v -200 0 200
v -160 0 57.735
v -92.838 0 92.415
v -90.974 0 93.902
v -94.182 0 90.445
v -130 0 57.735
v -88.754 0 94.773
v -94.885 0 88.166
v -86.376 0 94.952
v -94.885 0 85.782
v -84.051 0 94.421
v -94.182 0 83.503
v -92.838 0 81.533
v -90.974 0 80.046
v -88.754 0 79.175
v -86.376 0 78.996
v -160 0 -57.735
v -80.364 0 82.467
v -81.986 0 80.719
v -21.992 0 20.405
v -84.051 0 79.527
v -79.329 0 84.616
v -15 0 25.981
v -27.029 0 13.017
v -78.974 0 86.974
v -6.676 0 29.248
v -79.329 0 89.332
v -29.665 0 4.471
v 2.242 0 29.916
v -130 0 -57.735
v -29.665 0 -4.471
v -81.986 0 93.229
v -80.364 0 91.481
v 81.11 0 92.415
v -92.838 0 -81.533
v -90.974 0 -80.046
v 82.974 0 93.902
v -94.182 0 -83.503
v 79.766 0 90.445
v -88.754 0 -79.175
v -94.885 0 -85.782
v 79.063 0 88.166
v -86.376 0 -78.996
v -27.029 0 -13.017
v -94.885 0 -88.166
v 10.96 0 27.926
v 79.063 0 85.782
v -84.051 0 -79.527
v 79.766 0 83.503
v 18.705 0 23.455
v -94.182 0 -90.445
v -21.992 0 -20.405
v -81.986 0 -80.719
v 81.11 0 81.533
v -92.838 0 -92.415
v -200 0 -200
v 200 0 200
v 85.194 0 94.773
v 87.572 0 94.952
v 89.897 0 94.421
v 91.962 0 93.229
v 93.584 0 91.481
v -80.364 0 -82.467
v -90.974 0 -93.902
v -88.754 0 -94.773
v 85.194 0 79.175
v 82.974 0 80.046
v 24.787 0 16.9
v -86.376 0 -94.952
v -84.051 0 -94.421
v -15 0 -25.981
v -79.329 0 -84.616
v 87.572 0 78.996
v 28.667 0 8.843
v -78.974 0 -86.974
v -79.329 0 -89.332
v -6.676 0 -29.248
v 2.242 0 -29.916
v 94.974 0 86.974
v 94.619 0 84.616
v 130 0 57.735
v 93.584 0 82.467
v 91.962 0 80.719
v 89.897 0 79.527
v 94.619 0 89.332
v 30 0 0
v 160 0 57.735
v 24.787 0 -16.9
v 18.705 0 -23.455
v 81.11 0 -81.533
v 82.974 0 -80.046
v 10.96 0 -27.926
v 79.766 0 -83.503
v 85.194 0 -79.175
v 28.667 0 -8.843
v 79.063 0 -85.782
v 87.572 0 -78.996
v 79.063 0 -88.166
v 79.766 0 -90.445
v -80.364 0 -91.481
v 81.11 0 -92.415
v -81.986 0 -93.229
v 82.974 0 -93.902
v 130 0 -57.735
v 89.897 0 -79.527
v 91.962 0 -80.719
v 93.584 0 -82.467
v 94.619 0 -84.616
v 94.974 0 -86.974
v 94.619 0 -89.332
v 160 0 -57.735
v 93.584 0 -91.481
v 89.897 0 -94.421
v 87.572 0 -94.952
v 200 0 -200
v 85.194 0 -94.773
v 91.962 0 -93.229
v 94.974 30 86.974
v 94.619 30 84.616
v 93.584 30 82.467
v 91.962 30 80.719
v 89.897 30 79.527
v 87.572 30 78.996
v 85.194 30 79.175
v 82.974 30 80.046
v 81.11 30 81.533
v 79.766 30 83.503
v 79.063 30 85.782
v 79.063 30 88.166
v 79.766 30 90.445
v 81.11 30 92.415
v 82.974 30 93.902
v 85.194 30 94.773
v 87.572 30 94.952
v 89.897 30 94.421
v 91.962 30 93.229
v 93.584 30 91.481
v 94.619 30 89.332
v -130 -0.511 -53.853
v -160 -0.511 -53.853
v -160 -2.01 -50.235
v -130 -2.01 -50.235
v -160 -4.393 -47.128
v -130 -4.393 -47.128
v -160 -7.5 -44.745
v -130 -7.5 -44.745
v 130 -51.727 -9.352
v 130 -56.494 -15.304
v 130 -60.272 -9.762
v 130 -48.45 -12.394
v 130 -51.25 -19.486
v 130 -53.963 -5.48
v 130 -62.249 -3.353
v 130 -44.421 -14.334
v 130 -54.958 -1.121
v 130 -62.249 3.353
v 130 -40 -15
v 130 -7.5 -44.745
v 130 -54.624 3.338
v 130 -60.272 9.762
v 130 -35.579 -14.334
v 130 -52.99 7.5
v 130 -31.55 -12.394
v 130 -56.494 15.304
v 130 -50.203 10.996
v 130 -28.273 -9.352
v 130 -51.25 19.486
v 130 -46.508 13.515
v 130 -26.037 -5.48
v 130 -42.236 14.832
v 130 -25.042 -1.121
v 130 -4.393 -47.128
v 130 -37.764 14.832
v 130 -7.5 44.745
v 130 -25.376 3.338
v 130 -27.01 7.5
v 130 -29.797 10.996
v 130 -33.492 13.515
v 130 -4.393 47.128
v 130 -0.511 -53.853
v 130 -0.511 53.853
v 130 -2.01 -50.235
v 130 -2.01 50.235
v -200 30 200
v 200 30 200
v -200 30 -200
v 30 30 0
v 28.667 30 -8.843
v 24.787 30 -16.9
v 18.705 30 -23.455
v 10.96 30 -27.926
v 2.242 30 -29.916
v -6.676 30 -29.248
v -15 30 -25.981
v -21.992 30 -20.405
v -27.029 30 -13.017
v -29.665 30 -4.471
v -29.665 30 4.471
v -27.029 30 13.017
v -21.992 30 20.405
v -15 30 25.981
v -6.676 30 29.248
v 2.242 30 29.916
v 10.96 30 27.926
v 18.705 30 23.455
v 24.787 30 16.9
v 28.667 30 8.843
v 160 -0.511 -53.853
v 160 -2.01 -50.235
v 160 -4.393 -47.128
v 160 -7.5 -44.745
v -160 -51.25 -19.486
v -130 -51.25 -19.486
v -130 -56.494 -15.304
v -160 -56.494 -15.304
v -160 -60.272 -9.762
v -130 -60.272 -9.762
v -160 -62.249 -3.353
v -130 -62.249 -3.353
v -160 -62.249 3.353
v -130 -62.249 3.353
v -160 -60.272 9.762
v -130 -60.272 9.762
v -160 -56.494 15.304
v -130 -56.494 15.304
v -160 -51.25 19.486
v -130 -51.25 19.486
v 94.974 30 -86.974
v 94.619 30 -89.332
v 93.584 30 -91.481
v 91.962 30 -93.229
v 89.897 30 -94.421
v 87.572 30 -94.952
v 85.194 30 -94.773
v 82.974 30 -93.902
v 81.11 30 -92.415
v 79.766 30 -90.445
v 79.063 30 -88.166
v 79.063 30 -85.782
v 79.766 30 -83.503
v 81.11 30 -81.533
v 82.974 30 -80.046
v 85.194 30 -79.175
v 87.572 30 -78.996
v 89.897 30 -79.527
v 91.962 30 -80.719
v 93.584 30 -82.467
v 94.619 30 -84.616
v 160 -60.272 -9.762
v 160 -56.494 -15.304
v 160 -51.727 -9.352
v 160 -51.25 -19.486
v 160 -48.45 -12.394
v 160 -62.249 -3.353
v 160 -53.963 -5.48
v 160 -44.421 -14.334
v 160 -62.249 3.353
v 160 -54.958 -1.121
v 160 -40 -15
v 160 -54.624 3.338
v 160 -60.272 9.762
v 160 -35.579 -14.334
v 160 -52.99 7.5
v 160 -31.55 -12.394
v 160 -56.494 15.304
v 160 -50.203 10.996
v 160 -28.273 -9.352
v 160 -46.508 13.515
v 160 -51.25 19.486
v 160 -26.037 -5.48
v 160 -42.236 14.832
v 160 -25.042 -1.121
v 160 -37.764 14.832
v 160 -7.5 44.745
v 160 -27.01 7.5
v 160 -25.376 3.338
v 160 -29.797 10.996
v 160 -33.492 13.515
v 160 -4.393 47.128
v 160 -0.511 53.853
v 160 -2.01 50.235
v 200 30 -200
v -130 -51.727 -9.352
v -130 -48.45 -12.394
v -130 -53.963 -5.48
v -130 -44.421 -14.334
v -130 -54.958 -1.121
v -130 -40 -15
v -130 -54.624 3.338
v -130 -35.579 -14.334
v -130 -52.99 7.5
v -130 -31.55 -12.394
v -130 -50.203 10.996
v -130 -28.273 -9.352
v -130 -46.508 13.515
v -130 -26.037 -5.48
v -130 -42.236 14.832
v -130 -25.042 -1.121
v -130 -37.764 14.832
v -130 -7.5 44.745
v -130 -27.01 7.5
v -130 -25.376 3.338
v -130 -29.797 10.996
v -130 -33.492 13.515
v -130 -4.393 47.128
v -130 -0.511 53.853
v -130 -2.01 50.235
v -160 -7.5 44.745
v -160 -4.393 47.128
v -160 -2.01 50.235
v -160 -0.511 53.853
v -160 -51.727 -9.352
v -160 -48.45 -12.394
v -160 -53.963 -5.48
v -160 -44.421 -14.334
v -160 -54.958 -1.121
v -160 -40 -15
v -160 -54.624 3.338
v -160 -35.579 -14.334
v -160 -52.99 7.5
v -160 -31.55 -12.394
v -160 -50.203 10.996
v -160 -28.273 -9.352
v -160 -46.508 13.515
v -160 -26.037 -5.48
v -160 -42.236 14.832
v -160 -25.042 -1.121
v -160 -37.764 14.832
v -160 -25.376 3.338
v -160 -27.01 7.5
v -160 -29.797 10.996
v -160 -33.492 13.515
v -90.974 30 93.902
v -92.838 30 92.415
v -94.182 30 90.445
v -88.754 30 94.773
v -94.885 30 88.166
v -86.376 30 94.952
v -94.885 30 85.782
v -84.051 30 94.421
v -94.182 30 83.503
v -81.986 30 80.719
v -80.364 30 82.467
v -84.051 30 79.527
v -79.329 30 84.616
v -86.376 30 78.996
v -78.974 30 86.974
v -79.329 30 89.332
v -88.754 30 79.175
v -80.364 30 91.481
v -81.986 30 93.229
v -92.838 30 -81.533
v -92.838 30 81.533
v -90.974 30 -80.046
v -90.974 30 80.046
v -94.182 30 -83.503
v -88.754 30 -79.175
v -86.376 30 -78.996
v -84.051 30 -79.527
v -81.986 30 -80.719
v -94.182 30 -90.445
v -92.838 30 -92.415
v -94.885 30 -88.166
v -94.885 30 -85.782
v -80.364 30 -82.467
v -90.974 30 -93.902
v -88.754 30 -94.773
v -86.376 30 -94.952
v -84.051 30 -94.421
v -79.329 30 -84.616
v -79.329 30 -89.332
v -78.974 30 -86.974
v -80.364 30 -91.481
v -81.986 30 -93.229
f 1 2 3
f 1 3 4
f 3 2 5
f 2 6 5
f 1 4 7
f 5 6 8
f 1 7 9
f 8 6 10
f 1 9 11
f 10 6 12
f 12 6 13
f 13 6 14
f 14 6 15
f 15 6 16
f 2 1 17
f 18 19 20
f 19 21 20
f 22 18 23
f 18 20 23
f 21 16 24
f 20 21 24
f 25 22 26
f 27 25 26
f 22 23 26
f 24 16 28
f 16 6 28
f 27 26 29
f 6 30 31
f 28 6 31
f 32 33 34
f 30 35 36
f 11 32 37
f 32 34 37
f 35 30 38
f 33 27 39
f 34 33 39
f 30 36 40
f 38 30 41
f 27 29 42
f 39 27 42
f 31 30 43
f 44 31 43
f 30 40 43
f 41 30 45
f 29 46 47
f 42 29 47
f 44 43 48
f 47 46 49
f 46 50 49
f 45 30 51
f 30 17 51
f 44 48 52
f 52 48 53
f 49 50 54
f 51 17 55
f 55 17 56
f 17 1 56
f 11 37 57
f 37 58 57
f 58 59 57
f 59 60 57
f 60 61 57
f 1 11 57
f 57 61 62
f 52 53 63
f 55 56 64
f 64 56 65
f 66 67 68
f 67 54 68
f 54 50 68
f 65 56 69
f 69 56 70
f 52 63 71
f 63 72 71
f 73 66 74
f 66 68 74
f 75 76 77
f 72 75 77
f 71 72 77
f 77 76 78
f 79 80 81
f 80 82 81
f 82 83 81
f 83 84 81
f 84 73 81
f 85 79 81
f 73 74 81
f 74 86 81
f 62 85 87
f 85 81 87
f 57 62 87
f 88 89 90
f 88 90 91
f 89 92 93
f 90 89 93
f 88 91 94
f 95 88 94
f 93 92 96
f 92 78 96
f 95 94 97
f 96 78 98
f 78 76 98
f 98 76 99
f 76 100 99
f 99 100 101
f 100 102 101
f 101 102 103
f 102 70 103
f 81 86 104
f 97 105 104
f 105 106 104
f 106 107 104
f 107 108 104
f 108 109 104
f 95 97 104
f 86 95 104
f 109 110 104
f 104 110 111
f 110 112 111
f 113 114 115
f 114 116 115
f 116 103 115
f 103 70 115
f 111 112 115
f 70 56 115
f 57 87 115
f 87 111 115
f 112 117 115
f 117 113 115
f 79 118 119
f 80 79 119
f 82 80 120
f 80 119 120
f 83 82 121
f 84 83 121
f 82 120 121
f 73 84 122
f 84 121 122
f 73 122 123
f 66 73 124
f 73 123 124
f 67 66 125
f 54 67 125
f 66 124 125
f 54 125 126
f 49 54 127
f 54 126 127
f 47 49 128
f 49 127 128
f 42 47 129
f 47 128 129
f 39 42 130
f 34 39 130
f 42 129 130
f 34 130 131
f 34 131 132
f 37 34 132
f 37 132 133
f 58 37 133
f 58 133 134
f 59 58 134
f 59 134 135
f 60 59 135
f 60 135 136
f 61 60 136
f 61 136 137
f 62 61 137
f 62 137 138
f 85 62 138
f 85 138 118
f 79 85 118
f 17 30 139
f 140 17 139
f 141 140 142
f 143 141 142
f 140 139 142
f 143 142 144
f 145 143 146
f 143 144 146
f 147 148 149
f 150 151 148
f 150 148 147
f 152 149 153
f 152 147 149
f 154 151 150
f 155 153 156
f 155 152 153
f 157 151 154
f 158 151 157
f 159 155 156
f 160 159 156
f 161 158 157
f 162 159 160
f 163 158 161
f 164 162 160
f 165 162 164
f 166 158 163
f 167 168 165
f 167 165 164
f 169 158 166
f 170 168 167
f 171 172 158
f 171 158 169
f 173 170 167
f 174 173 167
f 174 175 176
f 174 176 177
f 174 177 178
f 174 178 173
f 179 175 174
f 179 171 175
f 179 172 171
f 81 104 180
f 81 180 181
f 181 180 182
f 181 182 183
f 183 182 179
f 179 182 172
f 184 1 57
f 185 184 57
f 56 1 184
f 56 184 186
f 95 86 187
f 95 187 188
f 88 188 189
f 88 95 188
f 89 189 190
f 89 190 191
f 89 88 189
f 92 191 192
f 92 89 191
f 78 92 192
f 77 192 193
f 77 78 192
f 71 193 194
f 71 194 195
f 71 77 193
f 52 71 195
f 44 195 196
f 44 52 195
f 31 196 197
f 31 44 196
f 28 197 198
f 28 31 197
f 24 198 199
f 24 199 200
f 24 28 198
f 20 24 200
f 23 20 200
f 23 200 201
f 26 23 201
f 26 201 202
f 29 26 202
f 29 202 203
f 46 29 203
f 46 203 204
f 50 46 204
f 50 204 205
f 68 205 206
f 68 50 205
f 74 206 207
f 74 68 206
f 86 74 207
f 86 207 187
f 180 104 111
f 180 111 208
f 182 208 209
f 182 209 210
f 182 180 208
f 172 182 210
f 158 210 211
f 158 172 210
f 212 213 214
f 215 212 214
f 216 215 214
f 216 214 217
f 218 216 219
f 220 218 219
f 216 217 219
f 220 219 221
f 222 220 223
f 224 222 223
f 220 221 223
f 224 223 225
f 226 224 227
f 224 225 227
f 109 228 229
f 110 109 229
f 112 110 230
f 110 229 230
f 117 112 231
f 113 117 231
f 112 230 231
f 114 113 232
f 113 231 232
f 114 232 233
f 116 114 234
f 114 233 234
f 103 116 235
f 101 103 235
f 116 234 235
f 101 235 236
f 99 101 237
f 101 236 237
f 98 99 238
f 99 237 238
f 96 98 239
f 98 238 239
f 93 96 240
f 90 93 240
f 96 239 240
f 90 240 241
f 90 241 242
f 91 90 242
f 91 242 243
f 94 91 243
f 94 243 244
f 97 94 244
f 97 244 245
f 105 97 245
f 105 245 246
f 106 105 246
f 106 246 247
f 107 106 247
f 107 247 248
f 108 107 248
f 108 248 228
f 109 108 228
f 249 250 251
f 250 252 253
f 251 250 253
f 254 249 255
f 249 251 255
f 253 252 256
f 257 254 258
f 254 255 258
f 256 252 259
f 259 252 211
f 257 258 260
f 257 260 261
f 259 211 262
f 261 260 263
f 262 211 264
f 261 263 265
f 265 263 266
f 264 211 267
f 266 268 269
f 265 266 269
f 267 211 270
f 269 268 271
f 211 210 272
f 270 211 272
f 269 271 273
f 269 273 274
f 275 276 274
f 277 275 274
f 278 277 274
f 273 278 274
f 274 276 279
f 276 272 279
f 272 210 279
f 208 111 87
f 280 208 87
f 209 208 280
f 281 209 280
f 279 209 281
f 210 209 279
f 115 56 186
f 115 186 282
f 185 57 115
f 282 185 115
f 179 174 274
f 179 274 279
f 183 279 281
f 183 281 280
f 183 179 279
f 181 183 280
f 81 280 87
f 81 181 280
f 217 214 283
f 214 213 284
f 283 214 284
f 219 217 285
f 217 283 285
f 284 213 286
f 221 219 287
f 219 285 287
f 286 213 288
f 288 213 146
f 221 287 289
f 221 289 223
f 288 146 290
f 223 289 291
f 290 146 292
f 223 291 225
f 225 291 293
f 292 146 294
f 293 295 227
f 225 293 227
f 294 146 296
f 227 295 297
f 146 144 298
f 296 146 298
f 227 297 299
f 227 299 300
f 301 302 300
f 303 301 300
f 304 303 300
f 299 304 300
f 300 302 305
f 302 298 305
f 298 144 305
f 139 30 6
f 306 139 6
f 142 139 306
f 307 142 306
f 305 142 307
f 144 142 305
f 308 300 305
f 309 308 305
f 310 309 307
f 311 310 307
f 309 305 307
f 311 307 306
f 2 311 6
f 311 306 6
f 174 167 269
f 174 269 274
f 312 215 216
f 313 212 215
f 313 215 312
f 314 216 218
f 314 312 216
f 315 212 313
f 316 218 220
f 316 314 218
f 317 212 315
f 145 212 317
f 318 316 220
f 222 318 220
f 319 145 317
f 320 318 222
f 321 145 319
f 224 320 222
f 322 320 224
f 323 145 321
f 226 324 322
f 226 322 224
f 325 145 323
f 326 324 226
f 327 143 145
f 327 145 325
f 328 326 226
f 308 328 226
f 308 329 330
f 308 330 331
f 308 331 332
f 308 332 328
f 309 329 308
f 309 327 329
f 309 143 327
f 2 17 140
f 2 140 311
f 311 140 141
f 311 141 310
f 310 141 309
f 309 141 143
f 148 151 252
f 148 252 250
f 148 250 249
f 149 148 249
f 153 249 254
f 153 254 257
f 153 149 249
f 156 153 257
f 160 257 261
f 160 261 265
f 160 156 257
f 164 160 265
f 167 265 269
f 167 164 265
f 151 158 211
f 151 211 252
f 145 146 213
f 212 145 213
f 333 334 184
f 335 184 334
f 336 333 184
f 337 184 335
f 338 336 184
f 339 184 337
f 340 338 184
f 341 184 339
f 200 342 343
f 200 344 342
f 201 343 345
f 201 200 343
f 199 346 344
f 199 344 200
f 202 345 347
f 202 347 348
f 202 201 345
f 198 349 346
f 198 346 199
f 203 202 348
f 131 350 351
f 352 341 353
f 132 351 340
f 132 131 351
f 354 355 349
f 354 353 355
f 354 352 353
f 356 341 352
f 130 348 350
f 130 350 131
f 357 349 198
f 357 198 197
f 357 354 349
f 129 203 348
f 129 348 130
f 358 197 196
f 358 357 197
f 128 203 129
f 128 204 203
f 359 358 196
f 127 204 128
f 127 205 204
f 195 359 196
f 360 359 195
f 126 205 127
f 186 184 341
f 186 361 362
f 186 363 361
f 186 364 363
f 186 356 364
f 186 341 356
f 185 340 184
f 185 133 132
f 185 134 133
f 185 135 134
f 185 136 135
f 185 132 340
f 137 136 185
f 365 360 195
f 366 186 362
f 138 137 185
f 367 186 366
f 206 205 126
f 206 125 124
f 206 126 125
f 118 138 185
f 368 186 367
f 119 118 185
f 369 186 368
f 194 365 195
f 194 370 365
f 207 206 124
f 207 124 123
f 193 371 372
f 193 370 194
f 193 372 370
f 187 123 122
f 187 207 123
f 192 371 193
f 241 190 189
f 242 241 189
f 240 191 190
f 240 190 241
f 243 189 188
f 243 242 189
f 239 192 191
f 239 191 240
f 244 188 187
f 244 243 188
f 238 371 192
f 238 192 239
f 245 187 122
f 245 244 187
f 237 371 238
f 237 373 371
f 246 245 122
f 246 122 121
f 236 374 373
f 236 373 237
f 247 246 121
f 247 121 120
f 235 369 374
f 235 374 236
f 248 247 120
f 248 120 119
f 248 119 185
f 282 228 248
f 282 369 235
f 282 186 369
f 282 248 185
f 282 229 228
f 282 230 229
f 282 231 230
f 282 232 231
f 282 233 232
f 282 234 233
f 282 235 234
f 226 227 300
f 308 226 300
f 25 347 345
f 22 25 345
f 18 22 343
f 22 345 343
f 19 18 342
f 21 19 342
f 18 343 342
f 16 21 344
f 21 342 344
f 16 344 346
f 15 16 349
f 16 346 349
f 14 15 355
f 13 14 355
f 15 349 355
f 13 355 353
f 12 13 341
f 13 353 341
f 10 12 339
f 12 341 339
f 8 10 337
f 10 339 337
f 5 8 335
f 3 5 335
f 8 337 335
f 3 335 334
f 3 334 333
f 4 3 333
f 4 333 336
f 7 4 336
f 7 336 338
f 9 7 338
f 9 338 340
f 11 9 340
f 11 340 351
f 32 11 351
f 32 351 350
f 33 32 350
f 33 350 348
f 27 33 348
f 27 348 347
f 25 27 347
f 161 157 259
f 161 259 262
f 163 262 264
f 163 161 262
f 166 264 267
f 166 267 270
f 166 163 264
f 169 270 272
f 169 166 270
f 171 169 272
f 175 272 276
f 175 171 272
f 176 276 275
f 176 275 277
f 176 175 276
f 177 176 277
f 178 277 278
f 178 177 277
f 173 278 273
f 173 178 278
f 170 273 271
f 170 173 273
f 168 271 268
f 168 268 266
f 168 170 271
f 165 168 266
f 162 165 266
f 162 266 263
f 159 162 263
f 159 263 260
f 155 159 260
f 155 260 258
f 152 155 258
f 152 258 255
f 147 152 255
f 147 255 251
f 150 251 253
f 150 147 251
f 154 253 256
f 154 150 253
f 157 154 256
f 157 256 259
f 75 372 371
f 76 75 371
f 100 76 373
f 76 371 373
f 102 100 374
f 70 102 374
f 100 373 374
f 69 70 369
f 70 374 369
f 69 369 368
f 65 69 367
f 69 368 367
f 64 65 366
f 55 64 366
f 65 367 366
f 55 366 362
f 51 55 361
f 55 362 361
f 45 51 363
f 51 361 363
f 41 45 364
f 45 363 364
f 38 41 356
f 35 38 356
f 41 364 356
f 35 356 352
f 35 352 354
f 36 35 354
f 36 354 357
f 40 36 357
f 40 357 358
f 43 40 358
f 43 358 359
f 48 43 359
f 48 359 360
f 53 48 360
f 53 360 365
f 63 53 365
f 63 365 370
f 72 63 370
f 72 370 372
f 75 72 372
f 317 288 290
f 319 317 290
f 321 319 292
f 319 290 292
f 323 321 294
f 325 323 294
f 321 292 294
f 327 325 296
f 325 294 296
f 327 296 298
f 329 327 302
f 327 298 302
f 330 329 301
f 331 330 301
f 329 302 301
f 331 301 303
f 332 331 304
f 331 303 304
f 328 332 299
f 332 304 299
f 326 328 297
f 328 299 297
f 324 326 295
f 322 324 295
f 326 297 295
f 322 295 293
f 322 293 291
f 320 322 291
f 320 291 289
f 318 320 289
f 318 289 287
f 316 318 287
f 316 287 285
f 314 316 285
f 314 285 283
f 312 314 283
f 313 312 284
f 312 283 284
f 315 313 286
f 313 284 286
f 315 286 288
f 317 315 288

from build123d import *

# Parameters (mm, degrees)
ESBO_O1_W                = 400
ESBO_O1_H                = 400
ESBO_O1_R                = 30
RESSALTO_EXTRUS_O1_DEPTH = 30
RESSALTO_EXTRUS_O2_START = 130
ESBO_O2_R                = 15
RESSALTO_EXTRUS_O2_DEPTH = 30
ESBO_O3_R                = 8
CORTE_EXTRUS_O1_DEPTH    = 93.5


with BuildPart() as part:
    # Esboço1 → Ressalto-extrusão1 (new body)
    with BuildSketch(Plane(origin=(0, 0, 0), x_dir=(1, 0, 0), z_dir=(0, 1, 0))):
        Rectangle(ESBO_O1_W, ESBO_O1_H)
        Circle(ESBO_O1_R, mode=Mode.SUBTRACT)
    extrude(amount=RESSALTO_EXTRUS_O1_DEPTH)

    # Esboço2 → Ressalto-extrusão2 (add)
    with BuildSketch(Plane(origin=(0, 0, 0), x_dir=(0, 0, -1), z_dir=(1, 0, 0)).offset(RESSALTO_EXTRUS_O2_START)):
        with BuildLine():
            Line((-19.485571585, -51.25), (-44.744645862, -7.5))
            ThreePointArc((-44.744645862, -7.5), (-50.235026919, -2.009618943), (-57.735026919, 0))
            Line((-57.735026919, 0), (57.735026919, 0))
            ThreePointArc((57.735026919, 0), (50.235026919, -2.009618943), (44.744645862, -7.5))
            Line((44.744645862, -7.5), (19.485571585, -51.25))
            ThreePointArc((19.485571585, -51.25), (0, -62.5), (-19.485571585, -51.25))
        make_face()
        with Locations((0, -40)):
            Circle(ESBO_O2_R, mode=Mode.SUBTRACT)
    ressalto_extrus_o2 = extrude(amount=RESSALTO_EXTRUS_O2_DEPTH)

    # Espelhar1: Ressalto-extrusão2 across plane
    add(ressalto_extrus_o2.mirror(Plane(origin=(0, 0, 0), x_dir=(0, 0, 1), z_dir=(1, 0, 0))))

    # Esboço3 → Corte-extrusão1 (cut, through all)
    with BuildSketch(Plane(origin=(0, 30, 0), x_dir=(1, 0, 0), z_dir=(0, 1, 0))):
        with Locations((-86.974, 86.974)):
            Circle(ESBO_O3_R)
        with Locations((86.974, 86.974)):
            Circle(ESBO_O3_R)
        with Locations((86.974, -86.974)):
            Circle(ESBO_O3_R)
        with Locations((-86.974, -86.974)):
            Circle(ESBO_O3_R)
    extrude(amount=-CORTE_EXTRUS_O1_DEPTH, mode=Mode.SUBTRACT)


solid = part.part
